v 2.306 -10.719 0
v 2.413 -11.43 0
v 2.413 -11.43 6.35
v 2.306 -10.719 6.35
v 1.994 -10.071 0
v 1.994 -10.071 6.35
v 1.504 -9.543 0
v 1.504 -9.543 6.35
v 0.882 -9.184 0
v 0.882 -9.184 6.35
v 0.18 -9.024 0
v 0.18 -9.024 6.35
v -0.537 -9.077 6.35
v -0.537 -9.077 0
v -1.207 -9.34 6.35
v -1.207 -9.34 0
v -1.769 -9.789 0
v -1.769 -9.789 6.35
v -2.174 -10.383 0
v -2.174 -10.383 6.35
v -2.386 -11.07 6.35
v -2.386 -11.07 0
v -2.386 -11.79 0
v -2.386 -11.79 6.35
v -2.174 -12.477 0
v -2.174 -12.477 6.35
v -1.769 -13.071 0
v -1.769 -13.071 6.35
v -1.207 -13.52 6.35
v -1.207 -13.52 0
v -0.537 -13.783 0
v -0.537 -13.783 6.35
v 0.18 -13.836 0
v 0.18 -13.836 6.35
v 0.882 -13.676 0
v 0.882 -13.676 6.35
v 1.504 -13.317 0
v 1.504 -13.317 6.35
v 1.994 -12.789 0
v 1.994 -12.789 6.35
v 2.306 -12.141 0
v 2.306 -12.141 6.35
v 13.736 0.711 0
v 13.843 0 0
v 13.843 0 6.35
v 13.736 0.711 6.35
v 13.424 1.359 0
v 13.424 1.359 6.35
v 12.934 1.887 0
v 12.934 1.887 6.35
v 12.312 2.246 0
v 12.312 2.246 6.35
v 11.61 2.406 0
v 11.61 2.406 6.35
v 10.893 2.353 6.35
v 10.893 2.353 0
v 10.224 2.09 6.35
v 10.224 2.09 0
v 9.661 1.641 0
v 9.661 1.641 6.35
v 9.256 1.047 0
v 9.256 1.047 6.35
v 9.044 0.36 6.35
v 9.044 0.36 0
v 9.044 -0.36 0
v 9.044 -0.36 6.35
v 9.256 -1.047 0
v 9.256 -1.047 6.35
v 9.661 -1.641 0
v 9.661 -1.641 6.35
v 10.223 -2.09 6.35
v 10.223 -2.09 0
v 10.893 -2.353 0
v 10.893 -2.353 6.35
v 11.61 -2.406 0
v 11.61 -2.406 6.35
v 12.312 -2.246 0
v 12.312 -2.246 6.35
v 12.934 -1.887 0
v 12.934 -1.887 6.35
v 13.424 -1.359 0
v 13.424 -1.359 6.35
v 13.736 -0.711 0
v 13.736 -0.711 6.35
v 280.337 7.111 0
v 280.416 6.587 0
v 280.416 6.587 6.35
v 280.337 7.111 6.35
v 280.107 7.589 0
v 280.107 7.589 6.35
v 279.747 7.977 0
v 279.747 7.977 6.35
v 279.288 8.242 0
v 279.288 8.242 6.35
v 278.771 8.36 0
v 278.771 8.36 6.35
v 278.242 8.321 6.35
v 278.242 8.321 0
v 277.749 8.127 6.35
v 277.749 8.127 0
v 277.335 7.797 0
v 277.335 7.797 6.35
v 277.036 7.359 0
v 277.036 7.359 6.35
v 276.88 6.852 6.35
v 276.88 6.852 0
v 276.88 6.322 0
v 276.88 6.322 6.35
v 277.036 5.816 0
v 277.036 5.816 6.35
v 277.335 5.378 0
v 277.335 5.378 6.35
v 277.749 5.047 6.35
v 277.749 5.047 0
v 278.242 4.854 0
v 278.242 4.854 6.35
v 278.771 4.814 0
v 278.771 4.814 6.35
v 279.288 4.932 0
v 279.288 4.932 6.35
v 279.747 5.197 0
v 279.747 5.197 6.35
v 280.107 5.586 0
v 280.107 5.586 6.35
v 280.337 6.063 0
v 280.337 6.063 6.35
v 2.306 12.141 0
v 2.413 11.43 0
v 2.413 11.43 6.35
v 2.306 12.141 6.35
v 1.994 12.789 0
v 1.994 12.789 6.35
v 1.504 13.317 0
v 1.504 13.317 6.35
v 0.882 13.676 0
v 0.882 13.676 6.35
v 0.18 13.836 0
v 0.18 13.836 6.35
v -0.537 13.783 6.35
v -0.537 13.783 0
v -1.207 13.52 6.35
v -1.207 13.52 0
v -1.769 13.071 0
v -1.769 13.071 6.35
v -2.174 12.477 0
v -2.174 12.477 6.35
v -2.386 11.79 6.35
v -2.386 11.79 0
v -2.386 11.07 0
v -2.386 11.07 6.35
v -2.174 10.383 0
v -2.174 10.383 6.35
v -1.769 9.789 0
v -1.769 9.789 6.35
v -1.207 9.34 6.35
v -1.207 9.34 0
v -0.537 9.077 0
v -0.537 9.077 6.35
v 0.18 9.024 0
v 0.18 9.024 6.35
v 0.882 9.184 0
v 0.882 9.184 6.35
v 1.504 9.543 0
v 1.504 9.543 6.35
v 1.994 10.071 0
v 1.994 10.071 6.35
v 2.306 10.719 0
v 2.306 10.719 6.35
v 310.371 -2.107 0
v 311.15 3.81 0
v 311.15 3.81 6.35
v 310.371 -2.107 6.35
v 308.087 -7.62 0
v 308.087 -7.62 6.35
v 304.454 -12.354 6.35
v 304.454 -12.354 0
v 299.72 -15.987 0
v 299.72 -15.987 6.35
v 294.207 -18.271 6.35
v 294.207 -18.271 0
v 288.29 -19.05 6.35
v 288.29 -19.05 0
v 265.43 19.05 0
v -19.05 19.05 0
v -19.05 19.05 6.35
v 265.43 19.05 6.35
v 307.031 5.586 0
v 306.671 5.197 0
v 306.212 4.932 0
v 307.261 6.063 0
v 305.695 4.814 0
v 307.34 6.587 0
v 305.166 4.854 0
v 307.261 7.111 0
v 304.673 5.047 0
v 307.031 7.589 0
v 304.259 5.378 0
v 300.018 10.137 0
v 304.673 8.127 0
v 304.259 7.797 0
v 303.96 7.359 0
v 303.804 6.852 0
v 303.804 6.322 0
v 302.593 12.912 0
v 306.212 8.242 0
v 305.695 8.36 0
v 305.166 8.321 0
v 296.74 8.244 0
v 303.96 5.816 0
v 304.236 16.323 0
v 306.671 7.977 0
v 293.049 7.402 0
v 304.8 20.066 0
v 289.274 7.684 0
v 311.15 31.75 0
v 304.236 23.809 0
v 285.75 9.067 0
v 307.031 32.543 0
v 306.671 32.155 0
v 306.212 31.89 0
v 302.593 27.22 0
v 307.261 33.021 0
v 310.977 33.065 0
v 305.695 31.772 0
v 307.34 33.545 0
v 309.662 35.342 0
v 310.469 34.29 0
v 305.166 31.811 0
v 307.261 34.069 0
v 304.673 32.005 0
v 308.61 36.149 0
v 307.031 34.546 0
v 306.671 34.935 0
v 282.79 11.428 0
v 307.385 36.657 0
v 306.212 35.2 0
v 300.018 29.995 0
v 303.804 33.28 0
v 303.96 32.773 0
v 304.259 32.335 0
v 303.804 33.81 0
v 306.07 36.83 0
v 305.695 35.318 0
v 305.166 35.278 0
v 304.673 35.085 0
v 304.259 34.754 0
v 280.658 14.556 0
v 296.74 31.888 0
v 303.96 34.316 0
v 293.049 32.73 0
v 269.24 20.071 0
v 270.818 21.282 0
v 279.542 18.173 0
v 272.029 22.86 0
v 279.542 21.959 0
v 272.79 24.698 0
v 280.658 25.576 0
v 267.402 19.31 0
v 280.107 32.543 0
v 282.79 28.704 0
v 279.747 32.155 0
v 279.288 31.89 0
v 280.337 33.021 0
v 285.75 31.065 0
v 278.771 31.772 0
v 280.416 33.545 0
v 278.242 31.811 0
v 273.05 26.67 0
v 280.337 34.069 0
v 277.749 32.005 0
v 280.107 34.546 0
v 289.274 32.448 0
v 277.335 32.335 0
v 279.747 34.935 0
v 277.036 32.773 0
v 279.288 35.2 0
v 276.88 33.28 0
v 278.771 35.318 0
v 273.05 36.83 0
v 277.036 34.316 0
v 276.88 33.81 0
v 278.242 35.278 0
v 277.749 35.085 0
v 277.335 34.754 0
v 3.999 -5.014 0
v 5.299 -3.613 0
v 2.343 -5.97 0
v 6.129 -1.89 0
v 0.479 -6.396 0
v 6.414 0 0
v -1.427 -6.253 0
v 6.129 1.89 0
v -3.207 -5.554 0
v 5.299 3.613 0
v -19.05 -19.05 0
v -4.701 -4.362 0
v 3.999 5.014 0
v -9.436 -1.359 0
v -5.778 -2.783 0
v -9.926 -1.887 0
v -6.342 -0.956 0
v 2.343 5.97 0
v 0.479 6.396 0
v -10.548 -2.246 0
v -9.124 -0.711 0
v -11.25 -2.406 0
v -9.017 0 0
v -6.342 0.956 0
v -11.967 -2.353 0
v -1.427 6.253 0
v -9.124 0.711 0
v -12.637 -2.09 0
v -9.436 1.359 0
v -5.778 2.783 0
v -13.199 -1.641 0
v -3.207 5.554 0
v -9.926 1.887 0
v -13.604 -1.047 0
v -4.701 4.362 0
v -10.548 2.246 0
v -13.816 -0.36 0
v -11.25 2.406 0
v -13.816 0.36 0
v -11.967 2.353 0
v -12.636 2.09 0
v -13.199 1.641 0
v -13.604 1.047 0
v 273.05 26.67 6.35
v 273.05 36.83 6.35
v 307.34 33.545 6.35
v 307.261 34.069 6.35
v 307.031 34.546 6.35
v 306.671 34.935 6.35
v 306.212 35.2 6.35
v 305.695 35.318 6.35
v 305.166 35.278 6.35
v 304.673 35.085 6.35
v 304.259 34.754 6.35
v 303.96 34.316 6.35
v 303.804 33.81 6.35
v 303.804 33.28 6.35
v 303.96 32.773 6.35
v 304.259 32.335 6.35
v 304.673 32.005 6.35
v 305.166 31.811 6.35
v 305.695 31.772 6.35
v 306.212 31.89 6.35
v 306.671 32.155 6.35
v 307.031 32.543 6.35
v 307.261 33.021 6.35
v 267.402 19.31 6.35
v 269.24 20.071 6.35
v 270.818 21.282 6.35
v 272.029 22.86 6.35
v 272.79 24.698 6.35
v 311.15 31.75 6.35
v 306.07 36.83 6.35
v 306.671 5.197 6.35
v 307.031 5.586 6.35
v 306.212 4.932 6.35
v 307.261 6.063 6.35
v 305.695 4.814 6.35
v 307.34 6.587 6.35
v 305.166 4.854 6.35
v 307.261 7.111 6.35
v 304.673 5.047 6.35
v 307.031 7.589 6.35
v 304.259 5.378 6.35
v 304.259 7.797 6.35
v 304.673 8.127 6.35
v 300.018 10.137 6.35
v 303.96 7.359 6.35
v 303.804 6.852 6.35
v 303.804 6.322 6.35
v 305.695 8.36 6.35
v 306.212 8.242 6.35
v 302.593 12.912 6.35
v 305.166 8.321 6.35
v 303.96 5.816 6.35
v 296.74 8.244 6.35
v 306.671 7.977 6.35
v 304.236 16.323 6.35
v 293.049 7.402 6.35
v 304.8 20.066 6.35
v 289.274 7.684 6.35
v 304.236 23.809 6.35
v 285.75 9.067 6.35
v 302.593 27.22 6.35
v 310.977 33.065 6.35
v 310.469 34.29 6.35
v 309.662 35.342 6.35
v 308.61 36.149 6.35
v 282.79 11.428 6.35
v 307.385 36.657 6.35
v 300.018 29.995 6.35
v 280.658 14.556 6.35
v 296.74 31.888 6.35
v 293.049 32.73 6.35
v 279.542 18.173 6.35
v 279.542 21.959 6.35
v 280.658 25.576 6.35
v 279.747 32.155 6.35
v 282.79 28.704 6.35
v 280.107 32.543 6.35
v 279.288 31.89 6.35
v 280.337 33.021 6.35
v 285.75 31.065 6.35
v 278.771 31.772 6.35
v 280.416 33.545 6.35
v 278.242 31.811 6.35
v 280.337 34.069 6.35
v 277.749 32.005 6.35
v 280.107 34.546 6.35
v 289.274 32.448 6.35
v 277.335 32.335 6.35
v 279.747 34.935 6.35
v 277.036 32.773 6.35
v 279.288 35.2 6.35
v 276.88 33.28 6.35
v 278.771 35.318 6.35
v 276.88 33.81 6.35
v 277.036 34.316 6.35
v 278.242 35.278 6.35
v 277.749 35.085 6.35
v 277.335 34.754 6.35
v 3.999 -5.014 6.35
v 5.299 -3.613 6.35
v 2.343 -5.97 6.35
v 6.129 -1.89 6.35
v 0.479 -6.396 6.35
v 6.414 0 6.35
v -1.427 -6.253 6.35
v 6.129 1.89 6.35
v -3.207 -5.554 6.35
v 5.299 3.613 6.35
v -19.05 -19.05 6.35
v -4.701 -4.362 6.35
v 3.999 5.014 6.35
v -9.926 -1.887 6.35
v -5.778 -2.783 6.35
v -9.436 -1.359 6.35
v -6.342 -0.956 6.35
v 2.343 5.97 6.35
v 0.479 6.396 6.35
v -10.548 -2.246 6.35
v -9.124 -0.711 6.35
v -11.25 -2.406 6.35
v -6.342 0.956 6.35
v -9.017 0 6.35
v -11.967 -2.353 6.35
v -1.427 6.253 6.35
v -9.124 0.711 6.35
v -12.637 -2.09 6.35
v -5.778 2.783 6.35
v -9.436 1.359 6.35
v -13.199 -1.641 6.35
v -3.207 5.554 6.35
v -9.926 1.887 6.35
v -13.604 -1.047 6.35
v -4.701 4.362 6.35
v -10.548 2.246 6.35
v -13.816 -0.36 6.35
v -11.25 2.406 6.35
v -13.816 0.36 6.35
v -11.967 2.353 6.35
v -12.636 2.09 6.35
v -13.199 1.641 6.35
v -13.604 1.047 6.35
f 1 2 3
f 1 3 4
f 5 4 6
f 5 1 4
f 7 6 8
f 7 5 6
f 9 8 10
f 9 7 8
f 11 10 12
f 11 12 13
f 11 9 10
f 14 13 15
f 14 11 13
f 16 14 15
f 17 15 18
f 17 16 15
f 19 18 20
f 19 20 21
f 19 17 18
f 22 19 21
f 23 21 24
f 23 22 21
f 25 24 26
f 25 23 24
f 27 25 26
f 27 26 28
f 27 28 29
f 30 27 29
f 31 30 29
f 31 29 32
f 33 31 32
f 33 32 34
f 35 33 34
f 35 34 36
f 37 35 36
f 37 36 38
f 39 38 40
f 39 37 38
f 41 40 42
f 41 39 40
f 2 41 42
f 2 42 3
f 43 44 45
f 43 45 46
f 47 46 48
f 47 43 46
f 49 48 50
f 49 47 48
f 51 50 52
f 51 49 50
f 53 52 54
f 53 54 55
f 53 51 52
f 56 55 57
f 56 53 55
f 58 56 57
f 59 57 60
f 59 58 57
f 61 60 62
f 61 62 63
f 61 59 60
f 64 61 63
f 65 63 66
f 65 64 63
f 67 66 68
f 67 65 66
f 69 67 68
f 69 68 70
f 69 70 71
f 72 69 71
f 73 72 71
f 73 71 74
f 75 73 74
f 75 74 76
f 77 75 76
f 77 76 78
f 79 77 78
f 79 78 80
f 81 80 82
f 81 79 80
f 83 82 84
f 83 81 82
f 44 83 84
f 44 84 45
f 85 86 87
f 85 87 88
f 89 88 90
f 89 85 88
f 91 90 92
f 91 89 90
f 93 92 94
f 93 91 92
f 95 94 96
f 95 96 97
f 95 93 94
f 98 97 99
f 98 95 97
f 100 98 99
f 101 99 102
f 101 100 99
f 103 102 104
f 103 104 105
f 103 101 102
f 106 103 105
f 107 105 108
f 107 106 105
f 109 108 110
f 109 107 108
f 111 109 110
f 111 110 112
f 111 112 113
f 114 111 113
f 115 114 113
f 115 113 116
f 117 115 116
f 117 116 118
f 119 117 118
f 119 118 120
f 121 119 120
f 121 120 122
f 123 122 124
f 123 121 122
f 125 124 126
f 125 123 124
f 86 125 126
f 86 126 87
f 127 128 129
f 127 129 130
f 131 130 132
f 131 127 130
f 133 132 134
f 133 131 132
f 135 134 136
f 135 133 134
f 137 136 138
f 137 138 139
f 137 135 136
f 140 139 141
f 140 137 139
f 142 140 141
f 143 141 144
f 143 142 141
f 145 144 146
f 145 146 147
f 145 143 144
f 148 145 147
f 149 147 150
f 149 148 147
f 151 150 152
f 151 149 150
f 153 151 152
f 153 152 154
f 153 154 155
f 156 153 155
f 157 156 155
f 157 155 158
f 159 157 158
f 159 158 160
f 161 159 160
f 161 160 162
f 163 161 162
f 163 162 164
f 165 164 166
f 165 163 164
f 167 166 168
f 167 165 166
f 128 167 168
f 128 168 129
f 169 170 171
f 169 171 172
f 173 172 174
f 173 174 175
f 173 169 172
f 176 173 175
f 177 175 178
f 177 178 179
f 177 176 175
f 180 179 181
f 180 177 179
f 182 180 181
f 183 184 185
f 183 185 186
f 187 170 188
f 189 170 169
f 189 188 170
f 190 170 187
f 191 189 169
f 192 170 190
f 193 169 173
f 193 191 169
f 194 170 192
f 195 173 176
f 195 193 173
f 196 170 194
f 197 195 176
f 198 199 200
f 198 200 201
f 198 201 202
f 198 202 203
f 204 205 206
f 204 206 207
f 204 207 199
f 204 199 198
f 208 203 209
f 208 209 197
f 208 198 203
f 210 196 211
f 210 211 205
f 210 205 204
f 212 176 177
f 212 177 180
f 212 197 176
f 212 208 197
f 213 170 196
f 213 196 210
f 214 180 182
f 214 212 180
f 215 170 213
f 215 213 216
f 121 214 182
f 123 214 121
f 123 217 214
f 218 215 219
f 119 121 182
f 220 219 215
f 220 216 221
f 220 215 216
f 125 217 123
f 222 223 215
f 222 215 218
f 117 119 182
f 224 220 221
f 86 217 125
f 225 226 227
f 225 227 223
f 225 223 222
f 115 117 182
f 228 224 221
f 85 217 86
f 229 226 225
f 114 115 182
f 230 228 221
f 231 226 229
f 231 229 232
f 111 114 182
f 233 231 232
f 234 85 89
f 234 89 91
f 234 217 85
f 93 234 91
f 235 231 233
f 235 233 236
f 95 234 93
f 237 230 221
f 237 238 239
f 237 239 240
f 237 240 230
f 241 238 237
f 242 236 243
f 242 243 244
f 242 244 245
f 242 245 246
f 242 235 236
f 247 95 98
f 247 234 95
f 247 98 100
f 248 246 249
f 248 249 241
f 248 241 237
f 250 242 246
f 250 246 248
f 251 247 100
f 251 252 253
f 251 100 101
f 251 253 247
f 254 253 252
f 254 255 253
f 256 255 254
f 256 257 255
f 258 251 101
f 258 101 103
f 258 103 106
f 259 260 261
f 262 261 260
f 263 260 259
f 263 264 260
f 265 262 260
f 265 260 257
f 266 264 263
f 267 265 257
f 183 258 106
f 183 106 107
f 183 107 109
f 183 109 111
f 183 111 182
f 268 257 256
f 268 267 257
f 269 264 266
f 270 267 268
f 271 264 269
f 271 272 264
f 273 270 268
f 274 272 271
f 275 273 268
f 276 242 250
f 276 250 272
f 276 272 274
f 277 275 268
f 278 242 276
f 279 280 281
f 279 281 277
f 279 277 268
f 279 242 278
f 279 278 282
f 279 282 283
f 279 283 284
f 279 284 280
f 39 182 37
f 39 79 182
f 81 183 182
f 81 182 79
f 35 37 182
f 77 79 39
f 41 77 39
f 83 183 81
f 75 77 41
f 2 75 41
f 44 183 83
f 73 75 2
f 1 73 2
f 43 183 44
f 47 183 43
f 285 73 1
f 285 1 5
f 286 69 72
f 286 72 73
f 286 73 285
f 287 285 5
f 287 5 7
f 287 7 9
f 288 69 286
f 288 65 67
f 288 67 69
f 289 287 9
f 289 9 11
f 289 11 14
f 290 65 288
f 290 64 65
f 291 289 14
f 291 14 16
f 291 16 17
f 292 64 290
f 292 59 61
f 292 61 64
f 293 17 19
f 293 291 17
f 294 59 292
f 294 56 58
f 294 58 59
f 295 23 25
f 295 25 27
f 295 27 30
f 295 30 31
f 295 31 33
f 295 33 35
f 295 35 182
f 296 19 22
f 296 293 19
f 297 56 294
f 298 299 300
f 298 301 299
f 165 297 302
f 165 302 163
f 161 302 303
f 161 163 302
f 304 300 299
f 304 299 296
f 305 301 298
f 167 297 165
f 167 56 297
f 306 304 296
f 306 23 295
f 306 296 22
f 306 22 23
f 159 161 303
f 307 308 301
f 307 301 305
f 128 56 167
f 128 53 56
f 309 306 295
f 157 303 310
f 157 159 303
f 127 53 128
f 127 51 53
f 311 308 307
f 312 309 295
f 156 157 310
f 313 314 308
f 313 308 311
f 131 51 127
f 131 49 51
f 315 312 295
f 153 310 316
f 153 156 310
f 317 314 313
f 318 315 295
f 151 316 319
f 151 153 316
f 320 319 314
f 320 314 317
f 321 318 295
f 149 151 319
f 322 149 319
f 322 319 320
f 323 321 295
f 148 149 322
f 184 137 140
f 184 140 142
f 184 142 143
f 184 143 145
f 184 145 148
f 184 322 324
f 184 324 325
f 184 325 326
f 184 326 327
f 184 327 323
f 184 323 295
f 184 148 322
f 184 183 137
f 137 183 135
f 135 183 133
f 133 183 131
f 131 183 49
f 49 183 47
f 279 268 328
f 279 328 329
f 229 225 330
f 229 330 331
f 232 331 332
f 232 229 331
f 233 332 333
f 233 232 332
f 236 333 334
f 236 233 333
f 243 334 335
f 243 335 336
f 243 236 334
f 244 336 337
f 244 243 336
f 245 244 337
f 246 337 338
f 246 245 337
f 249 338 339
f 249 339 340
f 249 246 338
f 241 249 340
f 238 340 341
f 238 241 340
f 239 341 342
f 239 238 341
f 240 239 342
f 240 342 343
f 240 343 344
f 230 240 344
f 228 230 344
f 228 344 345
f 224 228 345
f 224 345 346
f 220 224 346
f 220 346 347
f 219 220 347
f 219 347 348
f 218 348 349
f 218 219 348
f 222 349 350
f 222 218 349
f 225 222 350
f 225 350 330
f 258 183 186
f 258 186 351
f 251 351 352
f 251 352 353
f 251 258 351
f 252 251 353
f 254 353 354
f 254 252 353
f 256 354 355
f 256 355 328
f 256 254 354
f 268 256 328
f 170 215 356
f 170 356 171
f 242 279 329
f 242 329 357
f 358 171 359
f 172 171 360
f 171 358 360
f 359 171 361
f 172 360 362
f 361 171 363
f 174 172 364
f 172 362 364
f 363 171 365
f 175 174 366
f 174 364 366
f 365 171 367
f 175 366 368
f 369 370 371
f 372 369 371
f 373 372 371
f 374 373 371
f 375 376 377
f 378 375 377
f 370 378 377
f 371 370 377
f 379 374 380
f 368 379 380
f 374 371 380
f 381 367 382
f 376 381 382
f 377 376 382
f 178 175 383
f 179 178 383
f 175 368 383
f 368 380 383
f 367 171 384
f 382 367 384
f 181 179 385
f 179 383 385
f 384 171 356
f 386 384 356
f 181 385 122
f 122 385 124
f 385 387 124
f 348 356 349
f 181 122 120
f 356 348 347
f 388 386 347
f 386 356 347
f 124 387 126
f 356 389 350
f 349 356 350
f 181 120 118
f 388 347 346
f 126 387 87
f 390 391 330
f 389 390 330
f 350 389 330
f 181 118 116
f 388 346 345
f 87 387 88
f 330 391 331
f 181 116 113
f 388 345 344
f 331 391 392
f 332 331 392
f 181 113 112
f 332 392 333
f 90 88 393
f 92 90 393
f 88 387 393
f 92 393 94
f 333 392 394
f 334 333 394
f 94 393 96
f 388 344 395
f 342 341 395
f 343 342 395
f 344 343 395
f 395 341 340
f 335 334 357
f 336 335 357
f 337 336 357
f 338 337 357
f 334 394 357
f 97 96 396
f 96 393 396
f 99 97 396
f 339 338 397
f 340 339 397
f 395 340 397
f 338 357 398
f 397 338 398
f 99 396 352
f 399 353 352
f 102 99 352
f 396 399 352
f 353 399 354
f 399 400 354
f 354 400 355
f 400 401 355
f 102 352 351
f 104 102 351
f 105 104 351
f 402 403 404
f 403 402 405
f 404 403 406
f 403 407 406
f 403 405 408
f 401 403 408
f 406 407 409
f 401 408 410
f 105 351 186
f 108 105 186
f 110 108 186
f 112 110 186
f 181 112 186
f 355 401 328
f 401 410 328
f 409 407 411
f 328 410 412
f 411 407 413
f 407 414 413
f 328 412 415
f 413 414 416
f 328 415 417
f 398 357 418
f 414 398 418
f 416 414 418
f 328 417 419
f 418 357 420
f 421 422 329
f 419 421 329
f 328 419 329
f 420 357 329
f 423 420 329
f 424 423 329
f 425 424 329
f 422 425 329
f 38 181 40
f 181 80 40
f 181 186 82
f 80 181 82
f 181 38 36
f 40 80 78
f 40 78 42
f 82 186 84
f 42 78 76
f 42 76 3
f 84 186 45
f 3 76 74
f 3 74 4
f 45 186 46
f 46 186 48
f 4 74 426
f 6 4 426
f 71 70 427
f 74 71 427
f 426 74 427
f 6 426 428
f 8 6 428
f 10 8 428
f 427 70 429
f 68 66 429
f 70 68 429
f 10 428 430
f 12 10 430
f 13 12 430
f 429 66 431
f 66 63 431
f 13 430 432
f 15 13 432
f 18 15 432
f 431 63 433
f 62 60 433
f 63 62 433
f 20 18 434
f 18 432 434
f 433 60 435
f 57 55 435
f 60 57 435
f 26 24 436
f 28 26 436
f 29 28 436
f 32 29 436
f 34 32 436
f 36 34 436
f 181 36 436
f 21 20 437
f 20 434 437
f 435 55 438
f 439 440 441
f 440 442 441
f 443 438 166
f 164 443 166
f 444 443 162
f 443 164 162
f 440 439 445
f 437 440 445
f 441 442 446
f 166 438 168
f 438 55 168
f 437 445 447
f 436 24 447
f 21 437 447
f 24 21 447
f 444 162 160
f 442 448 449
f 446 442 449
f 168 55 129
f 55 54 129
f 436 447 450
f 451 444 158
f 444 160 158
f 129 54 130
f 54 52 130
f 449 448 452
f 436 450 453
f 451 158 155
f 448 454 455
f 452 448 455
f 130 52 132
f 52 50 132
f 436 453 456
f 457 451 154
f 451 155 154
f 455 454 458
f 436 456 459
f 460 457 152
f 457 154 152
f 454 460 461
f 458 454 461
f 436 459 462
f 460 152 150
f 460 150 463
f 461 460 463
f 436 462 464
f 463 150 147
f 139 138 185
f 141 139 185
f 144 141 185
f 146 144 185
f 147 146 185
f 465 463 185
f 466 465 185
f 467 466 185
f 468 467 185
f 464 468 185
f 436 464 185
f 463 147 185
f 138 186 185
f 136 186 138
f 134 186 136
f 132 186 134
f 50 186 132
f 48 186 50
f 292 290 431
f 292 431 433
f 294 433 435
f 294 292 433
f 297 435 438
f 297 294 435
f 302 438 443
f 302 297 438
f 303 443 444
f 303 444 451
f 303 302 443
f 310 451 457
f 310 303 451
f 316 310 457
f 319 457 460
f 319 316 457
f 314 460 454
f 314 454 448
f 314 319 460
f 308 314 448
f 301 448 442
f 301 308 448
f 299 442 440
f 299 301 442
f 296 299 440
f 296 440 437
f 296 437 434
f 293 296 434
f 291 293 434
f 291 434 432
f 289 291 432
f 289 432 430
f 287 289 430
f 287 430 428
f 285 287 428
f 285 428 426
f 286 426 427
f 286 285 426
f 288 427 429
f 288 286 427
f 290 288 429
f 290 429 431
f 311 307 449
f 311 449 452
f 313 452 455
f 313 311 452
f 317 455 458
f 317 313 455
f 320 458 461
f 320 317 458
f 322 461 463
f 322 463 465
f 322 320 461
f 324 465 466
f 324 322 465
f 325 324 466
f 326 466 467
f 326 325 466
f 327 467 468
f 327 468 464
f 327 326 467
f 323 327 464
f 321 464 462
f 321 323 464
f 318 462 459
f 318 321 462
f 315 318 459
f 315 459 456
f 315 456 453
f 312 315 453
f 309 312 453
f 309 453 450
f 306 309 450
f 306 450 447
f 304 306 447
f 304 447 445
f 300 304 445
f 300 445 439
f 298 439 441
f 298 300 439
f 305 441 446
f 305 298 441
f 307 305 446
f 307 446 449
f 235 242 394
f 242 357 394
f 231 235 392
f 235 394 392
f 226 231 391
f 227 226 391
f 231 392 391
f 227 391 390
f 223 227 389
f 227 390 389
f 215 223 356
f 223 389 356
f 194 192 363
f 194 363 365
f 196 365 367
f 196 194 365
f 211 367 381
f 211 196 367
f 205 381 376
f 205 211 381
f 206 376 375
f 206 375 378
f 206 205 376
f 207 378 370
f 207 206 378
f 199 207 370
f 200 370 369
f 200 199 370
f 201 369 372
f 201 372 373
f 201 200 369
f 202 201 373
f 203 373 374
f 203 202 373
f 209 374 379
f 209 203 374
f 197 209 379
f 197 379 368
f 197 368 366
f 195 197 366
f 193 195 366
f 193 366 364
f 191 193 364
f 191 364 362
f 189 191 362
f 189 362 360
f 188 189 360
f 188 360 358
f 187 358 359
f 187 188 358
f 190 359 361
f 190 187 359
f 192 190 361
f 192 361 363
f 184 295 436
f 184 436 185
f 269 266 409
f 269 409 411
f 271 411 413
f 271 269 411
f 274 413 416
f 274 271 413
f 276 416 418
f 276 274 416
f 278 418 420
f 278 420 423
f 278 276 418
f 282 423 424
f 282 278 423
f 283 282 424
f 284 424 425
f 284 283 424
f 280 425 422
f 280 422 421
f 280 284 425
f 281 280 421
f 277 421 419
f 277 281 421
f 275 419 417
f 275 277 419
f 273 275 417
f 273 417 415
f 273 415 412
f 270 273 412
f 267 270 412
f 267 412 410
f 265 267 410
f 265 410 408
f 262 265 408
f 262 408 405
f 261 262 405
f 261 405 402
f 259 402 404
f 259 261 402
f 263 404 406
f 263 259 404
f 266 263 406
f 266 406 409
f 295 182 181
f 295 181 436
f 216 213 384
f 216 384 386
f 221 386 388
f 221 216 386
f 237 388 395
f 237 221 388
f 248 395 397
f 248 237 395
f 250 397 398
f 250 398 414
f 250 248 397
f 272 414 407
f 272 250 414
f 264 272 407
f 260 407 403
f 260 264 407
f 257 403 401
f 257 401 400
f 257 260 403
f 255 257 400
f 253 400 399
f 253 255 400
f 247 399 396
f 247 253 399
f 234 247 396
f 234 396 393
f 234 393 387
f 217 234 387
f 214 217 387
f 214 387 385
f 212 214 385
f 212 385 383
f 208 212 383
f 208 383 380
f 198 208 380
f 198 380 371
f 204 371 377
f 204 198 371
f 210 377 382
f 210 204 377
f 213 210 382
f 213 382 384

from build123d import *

# Parameters (mm, degrees)
SKETCH1_R           = 6.4135
SKETCH1_R_2         = 2.413
SKETCH1_R_3         = 12.7
SKETCH1_R_4         = 1.778
BOSS_EXTRUDE1_DEPTH = 6.35
FILLET1_R           = 5.08


with BuildPart() as part:
    # Sketch1 → Boss-Extrude1 (new body)
    with BuildSketch(Plane.XY):
        with BuildLine():
            Line((-19.05, 19.05), (265.43, 19.05))
            ThreePointArc((265.43, 19.05), (270.818153673, 21.281846327), (273.05, 26.67))
            Line((273.05, 26.67), (273.05, 36.83))
            Line((273.05, 36.83), (311.15, 36.83))
            Line((311.15, 36.83), (311.15, 3.81))
            ThreePointArc((311.15, 3.81), (304.454461018, -12.354461018), (288.29, -19.05))
            Line((288.29, -19.05), (286.189260549, -19.05))
            Line((286.189260549, -19.05), (-19.05, -19.05))
            Line((-19.05, -19.05), (-19.05, 19.05))
        make_face()
        Circle(SKETCH1_R, mode=Mode.SUBTRACT)
        with Locations((0, 11.43)):
            Circle(SKETCH1_R_2, mode=Mode.SUBTRACT)
        with Locations((11.43, 0)):
            Circle(SKETCH1_R_2, mode=Mode.SUBTRACT)
        with Locations((0, -11.43)):
            Circle(SKETCH1_R_2, mode=Mode.SUBTRACT)
        with Locations((-11.43, 0)):
            Circle(SKETCH1_R_2, mode=Mode.SUBTRACT)
        with Locations((292.1, 20.066)):
            Circle(SKETCH1_R_3, mode=Mode.SUBTRACT)
        with Locations((278.638, 33.544763148)):
            Circle(SKETCH1_R_4, mode=Mode.SUBTRACT)
        with Locations((305.562, 33.544763148)):
            Circle(SKETCH1_R_4, mode=Mode.SUBTRACT)
        with Locations((305.562, 6.587236852)):
            Circle(SKETCH1_R_4, mode=Mode.SUBTRACT)
        with Locations((278.638, 6.587236852)):
            Circle(SKETCH1_R_4, mode=Mode.SUBTRACT)
    extrude(amount=BOSS_EXTRUDE1_DEPTH)

    # Fillet1
    fillet1_edges = [part.edges().sort_by_distance(p)[0] for p in [
        (311.15, 36.83, 3.175),
    ]]
    fillet(fillet1_edges, radius=FILLET1_R)


solid = part.part
